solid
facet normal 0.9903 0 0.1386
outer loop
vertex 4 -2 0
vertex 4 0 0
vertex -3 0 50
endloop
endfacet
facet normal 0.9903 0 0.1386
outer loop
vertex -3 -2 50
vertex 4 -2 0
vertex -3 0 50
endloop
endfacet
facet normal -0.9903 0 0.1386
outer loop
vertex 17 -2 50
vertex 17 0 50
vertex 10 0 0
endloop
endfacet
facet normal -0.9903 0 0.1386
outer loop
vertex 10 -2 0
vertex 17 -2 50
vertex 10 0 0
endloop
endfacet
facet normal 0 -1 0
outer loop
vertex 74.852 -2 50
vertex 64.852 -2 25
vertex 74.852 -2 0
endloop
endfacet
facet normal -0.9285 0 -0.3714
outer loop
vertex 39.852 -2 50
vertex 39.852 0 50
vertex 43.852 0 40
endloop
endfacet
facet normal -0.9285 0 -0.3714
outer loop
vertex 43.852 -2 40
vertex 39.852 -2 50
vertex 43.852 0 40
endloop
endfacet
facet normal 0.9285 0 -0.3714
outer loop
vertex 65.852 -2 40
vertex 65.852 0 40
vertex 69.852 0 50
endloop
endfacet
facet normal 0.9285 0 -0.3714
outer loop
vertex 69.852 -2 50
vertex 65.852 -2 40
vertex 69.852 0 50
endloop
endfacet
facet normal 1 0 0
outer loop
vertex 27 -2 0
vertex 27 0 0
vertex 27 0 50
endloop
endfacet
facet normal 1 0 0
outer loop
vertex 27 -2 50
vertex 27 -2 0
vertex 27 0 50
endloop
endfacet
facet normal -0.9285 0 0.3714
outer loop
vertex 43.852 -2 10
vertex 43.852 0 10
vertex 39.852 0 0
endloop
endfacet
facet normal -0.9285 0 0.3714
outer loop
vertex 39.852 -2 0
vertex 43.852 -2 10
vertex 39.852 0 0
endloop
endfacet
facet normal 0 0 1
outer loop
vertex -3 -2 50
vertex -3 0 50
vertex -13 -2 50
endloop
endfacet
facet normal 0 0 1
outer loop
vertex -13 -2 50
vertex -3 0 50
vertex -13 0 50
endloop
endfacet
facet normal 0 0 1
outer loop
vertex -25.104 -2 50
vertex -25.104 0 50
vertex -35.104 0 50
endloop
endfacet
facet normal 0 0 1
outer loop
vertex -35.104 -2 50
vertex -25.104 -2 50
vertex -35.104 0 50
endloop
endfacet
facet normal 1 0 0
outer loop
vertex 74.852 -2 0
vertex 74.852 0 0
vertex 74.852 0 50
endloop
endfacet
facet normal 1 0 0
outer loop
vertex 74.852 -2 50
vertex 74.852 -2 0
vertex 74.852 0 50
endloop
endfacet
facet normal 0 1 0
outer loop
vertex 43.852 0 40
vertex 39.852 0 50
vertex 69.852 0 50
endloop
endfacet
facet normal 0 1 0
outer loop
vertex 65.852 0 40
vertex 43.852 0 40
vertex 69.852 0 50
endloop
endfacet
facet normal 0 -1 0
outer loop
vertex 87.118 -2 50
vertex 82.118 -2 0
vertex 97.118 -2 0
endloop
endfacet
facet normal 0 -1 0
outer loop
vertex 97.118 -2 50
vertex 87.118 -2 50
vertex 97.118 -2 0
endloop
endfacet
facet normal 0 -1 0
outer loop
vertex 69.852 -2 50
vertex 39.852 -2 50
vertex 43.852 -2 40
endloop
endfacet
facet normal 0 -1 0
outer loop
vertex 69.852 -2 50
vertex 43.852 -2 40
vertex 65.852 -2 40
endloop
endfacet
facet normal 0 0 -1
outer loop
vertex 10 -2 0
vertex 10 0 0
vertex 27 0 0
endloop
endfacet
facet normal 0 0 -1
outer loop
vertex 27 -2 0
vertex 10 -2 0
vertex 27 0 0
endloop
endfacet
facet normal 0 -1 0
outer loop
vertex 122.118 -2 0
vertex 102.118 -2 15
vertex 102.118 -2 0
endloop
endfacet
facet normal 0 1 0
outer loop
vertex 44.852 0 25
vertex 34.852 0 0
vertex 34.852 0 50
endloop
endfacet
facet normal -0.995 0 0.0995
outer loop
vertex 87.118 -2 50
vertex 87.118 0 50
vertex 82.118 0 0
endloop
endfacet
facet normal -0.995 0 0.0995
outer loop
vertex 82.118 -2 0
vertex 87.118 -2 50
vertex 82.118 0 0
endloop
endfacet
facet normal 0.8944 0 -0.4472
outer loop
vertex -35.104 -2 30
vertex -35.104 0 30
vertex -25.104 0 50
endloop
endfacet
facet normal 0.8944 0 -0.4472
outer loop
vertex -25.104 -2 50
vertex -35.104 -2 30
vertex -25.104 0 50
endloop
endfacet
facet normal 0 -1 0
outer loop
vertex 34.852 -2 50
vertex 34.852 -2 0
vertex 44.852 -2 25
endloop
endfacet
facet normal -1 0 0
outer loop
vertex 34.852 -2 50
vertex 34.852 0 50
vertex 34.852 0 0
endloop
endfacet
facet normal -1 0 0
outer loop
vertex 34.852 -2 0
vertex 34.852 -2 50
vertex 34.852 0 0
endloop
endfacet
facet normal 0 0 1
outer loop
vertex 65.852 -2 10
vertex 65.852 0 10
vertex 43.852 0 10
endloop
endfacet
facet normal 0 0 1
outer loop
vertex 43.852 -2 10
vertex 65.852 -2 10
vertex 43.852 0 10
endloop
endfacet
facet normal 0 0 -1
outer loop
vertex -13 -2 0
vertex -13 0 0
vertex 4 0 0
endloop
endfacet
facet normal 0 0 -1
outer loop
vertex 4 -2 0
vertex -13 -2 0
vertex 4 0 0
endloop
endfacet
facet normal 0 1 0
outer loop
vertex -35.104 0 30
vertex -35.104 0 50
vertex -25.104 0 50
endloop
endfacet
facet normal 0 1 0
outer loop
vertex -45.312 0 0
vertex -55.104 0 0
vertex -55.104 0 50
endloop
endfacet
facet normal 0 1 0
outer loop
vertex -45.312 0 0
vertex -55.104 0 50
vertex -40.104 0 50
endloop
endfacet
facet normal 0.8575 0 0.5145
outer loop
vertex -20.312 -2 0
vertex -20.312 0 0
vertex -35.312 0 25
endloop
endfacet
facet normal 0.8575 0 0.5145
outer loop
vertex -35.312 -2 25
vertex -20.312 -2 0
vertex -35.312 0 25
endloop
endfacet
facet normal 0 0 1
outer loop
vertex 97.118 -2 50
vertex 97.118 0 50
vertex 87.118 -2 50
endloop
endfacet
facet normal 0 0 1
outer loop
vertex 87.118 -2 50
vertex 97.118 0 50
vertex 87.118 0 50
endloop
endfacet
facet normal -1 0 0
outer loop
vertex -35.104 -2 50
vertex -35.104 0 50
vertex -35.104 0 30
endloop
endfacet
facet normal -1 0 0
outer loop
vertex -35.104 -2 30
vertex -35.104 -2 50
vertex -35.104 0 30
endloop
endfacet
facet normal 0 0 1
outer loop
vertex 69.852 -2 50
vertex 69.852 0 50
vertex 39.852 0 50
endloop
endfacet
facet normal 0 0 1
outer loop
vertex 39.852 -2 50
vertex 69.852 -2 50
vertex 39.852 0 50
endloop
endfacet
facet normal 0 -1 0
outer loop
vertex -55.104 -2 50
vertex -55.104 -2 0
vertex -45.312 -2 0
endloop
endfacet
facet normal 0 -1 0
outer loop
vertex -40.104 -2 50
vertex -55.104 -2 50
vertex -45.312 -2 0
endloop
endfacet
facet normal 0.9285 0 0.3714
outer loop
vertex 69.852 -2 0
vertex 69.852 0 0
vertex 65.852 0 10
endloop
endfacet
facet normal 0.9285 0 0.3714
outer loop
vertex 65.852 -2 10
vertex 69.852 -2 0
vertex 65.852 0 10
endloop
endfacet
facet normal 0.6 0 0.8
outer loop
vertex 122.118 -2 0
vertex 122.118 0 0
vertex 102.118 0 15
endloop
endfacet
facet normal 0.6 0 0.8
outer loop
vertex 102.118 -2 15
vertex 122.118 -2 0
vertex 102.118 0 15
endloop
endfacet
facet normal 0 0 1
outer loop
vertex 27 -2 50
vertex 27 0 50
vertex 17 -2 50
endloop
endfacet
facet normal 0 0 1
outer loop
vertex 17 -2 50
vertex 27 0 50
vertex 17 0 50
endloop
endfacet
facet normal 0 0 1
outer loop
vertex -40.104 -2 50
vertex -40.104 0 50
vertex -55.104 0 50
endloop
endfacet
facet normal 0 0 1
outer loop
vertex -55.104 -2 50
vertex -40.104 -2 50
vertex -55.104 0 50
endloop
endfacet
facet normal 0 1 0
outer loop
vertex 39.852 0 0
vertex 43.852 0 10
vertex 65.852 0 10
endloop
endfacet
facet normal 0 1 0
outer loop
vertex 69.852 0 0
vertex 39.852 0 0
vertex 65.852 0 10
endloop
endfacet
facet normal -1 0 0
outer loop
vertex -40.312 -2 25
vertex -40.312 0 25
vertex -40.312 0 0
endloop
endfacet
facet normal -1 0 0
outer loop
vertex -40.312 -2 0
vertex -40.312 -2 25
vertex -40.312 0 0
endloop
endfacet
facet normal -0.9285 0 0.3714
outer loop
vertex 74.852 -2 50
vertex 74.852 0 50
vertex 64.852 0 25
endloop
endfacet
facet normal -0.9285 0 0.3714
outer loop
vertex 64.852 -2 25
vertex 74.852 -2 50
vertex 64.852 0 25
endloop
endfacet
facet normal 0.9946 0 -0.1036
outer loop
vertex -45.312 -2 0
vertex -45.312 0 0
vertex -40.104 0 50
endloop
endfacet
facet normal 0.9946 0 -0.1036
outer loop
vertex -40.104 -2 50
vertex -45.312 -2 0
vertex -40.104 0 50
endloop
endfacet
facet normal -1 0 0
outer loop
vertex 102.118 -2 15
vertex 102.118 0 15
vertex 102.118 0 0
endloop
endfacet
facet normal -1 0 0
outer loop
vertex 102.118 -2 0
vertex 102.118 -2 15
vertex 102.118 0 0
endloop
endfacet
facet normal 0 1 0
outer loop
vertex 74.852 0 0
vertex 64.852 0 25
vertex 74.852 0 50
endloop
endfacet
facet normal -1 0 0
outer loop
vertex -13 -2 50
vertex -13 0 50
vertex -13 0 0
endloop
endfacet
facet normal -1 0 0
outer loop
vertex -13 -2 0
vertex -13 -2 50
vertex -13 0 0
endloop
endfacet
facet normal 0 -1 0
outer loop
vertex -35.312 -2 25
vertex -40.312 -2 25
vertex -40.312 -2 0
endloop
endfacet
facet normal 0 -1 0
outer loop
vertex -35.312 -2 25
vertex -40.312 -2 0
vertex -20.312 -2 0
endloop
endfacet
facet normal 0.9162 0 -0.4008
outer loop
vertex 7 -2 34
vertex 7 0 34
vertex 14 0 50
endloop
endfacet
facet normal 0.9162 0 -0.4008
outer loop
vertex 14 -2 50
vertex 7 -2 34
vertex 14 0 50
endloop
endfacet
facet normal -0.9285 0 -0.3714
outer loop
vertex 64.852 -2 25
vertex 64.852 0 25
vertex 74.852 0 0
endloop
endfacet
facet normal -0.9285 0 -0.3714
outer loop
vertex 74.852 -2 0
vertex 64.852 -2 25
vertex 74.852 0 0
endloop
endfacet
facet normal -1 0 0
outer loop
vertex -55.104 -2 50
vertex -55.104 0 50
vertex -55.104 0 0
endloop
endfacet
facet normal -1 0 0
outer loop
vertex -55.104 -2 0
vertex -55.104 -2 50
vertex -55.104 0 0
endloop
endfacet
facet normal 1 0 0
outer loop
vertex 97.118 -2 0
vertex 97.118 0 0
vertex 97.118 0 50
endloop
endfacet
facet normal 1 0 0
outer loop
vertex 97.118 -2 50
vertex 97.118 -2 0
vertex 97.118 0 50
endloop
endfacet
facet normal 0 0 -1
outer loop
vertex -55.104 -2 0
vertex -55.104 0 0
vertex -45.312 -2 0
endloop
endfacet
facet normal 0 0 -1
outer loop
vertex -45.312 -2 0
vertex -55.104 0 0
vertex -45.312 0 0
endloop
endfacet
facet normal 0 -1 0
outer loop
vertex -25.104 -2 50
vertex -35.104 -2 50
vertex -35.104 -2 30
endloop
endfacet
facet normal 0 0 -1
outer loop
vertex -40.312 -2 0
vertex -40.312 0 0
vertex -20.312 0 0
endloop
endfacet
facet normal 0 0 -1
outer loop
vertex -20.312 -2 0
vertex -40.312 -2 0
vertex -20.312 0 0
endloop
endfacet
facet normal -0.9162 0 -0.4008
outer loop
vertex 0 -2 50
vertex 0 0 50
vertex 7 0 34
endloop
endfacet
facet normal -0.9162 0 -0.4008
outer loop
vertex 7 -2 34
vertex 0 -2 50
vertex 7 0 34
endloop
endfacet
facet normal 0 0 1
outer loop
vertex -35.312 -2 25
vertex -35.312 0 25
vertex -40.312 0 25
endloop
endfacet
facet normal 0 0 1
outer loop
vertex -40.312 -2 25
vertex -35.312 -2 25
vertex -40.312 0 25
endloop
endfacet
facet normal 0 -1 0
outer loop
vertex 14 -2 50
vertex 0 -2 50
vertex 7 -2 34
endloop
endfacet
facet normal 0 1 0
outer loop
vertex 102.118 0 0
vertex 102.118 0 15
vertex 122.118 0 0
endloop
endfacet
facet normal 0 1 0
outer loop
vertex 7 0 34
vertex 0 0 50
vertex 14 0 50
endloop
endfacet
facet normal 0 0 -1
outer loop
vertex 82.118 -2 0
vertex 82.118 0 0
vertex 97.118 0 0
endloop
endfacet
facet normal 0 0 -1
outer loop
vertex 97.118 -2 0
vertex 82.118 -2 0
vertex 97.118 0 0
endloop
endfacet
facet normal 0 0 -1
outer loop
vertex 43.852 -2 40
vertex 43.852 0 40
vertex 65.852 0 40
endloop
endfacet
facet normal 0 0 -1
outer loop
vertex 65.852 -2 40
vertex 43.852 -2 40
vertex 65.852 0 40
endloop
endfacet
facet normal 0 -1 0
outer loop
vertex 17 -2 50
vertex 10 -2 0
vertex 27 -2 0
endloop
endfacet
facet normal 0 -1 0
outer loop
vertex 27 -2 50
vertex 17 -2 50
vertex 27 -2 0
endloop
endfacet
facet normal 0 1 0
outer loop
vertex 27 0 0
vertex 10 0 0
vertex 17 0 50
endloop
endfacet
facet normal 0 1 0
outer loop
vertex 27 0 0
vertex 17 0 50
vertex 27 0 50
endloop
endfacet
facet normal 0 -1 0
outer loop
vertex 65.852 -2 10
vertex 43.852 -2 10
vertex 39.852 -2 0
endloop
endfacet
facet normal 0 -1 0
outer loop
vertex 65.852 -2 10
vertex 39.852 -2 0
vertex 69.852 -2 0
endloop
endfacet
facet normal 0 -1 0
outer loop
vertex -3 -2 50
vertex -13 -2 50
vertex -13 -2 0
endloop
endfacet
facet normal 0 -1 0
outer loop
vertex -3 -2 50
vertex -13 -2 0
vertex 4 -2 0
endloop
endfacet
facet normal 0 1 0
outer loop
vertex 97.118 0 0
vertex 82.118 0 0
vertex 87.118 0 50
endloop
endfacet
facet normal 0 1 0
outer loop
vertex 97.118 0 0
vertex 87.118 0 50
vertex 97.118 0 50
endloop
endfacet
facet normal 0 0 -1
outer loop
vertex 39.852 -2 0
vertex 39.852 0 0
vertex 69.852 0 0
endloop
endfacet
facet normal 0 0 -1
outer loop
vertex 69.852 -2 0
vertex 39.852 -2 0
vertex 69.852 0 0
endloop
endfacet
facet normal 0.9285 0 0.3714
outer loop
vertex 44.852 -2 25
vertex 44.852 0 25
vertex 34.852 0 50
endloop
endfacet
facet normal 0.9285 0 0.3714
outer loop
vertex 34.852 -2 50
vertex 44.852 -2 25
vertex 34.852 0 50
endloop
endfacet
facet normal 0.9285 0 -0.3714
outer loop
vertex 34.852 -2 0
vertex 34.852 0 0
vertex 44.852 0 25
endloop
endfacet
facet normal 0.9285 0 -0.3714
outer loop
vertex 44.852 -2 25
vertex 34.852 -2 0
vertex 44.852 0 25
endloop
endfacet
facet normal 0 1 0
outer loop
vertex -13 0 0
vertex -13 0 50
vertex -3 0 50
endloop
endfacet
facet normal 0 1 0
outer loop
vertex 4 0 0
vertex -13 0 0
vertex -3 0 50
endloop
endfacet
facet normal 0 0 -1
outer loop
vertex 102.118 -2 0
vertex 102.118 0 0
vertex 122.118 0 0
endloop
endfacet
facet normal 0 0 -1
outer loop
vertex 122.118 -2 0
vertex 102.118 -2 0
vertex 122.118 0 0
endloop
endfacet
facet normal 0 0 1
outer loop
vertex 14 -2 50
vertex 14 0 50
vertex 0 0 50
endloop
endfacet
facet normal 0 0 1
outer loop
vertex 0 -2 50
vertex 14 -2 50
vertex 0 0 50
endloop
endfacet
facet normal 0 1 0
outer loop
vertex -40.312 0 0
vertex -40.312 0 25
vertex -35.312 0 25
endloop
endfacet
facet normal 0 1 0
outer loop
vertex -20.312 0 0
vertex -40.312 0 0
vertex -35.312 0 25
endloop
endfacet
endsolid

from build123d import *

# Parameters (mm, degrees)
F4_DEPTH = 2


with BuildPart() as f4:
    # F0 (on Front) + F1 (on Front) + F2 (on Front) + F3 (on Front) → F4 (new body)
    with BuildSketch(Plane.XZ):
        Polygon((-55.104164, 50), (-55.104164, 0), (-45.312497, 0), (-40.104164, 50), align=None)
        Polygon((-40.312497, 25), (-40.312497, 0), (-20.312497, 0), (-35.312497, 25), align=None)
        Polygon((-35.104164, 50), (-35.104164, 30), (-25.104164, 50), align=None)
    with BuildSketch(Plane.XZ):
        Polygon((-13, 50), (-13, 0), (4, 0), (-3, 50), align=None)
        Polygon((14, 50), (0, 50), (7, 34), align=None)
        Polygon((27, 0), (27, 50), (17, 50), (10, 0), align=None)
    with BuildSketch(Plane.XZ):
        Polygon((34.851789, 50), (34.851789, 0), (44.851789, 25), align=None)
        Polygon((43.851789, 10), (39.851789, 0), (69.851789, 0), (65.851789, 10), align=None)
        Polygon((74.851789, 0), (74.851789, 50), (64.851789, 25), align=None)
        Polygon((39.851789, 50), (43.851789, 40), (65.851789, 40), (69.851789, 50), align=None)
    with BuildSketch(Plane.XZ):
        Polygon((87.117943, 50), (82.117943, 0), (97.117943, 0), (97.117943, 50), align=None)
        Polygon((102.117943, 15), (102.117943, 0), (122.117943, 0), align=None)
    extrude(amount=F4_DEPTH)


solid = f4.part
